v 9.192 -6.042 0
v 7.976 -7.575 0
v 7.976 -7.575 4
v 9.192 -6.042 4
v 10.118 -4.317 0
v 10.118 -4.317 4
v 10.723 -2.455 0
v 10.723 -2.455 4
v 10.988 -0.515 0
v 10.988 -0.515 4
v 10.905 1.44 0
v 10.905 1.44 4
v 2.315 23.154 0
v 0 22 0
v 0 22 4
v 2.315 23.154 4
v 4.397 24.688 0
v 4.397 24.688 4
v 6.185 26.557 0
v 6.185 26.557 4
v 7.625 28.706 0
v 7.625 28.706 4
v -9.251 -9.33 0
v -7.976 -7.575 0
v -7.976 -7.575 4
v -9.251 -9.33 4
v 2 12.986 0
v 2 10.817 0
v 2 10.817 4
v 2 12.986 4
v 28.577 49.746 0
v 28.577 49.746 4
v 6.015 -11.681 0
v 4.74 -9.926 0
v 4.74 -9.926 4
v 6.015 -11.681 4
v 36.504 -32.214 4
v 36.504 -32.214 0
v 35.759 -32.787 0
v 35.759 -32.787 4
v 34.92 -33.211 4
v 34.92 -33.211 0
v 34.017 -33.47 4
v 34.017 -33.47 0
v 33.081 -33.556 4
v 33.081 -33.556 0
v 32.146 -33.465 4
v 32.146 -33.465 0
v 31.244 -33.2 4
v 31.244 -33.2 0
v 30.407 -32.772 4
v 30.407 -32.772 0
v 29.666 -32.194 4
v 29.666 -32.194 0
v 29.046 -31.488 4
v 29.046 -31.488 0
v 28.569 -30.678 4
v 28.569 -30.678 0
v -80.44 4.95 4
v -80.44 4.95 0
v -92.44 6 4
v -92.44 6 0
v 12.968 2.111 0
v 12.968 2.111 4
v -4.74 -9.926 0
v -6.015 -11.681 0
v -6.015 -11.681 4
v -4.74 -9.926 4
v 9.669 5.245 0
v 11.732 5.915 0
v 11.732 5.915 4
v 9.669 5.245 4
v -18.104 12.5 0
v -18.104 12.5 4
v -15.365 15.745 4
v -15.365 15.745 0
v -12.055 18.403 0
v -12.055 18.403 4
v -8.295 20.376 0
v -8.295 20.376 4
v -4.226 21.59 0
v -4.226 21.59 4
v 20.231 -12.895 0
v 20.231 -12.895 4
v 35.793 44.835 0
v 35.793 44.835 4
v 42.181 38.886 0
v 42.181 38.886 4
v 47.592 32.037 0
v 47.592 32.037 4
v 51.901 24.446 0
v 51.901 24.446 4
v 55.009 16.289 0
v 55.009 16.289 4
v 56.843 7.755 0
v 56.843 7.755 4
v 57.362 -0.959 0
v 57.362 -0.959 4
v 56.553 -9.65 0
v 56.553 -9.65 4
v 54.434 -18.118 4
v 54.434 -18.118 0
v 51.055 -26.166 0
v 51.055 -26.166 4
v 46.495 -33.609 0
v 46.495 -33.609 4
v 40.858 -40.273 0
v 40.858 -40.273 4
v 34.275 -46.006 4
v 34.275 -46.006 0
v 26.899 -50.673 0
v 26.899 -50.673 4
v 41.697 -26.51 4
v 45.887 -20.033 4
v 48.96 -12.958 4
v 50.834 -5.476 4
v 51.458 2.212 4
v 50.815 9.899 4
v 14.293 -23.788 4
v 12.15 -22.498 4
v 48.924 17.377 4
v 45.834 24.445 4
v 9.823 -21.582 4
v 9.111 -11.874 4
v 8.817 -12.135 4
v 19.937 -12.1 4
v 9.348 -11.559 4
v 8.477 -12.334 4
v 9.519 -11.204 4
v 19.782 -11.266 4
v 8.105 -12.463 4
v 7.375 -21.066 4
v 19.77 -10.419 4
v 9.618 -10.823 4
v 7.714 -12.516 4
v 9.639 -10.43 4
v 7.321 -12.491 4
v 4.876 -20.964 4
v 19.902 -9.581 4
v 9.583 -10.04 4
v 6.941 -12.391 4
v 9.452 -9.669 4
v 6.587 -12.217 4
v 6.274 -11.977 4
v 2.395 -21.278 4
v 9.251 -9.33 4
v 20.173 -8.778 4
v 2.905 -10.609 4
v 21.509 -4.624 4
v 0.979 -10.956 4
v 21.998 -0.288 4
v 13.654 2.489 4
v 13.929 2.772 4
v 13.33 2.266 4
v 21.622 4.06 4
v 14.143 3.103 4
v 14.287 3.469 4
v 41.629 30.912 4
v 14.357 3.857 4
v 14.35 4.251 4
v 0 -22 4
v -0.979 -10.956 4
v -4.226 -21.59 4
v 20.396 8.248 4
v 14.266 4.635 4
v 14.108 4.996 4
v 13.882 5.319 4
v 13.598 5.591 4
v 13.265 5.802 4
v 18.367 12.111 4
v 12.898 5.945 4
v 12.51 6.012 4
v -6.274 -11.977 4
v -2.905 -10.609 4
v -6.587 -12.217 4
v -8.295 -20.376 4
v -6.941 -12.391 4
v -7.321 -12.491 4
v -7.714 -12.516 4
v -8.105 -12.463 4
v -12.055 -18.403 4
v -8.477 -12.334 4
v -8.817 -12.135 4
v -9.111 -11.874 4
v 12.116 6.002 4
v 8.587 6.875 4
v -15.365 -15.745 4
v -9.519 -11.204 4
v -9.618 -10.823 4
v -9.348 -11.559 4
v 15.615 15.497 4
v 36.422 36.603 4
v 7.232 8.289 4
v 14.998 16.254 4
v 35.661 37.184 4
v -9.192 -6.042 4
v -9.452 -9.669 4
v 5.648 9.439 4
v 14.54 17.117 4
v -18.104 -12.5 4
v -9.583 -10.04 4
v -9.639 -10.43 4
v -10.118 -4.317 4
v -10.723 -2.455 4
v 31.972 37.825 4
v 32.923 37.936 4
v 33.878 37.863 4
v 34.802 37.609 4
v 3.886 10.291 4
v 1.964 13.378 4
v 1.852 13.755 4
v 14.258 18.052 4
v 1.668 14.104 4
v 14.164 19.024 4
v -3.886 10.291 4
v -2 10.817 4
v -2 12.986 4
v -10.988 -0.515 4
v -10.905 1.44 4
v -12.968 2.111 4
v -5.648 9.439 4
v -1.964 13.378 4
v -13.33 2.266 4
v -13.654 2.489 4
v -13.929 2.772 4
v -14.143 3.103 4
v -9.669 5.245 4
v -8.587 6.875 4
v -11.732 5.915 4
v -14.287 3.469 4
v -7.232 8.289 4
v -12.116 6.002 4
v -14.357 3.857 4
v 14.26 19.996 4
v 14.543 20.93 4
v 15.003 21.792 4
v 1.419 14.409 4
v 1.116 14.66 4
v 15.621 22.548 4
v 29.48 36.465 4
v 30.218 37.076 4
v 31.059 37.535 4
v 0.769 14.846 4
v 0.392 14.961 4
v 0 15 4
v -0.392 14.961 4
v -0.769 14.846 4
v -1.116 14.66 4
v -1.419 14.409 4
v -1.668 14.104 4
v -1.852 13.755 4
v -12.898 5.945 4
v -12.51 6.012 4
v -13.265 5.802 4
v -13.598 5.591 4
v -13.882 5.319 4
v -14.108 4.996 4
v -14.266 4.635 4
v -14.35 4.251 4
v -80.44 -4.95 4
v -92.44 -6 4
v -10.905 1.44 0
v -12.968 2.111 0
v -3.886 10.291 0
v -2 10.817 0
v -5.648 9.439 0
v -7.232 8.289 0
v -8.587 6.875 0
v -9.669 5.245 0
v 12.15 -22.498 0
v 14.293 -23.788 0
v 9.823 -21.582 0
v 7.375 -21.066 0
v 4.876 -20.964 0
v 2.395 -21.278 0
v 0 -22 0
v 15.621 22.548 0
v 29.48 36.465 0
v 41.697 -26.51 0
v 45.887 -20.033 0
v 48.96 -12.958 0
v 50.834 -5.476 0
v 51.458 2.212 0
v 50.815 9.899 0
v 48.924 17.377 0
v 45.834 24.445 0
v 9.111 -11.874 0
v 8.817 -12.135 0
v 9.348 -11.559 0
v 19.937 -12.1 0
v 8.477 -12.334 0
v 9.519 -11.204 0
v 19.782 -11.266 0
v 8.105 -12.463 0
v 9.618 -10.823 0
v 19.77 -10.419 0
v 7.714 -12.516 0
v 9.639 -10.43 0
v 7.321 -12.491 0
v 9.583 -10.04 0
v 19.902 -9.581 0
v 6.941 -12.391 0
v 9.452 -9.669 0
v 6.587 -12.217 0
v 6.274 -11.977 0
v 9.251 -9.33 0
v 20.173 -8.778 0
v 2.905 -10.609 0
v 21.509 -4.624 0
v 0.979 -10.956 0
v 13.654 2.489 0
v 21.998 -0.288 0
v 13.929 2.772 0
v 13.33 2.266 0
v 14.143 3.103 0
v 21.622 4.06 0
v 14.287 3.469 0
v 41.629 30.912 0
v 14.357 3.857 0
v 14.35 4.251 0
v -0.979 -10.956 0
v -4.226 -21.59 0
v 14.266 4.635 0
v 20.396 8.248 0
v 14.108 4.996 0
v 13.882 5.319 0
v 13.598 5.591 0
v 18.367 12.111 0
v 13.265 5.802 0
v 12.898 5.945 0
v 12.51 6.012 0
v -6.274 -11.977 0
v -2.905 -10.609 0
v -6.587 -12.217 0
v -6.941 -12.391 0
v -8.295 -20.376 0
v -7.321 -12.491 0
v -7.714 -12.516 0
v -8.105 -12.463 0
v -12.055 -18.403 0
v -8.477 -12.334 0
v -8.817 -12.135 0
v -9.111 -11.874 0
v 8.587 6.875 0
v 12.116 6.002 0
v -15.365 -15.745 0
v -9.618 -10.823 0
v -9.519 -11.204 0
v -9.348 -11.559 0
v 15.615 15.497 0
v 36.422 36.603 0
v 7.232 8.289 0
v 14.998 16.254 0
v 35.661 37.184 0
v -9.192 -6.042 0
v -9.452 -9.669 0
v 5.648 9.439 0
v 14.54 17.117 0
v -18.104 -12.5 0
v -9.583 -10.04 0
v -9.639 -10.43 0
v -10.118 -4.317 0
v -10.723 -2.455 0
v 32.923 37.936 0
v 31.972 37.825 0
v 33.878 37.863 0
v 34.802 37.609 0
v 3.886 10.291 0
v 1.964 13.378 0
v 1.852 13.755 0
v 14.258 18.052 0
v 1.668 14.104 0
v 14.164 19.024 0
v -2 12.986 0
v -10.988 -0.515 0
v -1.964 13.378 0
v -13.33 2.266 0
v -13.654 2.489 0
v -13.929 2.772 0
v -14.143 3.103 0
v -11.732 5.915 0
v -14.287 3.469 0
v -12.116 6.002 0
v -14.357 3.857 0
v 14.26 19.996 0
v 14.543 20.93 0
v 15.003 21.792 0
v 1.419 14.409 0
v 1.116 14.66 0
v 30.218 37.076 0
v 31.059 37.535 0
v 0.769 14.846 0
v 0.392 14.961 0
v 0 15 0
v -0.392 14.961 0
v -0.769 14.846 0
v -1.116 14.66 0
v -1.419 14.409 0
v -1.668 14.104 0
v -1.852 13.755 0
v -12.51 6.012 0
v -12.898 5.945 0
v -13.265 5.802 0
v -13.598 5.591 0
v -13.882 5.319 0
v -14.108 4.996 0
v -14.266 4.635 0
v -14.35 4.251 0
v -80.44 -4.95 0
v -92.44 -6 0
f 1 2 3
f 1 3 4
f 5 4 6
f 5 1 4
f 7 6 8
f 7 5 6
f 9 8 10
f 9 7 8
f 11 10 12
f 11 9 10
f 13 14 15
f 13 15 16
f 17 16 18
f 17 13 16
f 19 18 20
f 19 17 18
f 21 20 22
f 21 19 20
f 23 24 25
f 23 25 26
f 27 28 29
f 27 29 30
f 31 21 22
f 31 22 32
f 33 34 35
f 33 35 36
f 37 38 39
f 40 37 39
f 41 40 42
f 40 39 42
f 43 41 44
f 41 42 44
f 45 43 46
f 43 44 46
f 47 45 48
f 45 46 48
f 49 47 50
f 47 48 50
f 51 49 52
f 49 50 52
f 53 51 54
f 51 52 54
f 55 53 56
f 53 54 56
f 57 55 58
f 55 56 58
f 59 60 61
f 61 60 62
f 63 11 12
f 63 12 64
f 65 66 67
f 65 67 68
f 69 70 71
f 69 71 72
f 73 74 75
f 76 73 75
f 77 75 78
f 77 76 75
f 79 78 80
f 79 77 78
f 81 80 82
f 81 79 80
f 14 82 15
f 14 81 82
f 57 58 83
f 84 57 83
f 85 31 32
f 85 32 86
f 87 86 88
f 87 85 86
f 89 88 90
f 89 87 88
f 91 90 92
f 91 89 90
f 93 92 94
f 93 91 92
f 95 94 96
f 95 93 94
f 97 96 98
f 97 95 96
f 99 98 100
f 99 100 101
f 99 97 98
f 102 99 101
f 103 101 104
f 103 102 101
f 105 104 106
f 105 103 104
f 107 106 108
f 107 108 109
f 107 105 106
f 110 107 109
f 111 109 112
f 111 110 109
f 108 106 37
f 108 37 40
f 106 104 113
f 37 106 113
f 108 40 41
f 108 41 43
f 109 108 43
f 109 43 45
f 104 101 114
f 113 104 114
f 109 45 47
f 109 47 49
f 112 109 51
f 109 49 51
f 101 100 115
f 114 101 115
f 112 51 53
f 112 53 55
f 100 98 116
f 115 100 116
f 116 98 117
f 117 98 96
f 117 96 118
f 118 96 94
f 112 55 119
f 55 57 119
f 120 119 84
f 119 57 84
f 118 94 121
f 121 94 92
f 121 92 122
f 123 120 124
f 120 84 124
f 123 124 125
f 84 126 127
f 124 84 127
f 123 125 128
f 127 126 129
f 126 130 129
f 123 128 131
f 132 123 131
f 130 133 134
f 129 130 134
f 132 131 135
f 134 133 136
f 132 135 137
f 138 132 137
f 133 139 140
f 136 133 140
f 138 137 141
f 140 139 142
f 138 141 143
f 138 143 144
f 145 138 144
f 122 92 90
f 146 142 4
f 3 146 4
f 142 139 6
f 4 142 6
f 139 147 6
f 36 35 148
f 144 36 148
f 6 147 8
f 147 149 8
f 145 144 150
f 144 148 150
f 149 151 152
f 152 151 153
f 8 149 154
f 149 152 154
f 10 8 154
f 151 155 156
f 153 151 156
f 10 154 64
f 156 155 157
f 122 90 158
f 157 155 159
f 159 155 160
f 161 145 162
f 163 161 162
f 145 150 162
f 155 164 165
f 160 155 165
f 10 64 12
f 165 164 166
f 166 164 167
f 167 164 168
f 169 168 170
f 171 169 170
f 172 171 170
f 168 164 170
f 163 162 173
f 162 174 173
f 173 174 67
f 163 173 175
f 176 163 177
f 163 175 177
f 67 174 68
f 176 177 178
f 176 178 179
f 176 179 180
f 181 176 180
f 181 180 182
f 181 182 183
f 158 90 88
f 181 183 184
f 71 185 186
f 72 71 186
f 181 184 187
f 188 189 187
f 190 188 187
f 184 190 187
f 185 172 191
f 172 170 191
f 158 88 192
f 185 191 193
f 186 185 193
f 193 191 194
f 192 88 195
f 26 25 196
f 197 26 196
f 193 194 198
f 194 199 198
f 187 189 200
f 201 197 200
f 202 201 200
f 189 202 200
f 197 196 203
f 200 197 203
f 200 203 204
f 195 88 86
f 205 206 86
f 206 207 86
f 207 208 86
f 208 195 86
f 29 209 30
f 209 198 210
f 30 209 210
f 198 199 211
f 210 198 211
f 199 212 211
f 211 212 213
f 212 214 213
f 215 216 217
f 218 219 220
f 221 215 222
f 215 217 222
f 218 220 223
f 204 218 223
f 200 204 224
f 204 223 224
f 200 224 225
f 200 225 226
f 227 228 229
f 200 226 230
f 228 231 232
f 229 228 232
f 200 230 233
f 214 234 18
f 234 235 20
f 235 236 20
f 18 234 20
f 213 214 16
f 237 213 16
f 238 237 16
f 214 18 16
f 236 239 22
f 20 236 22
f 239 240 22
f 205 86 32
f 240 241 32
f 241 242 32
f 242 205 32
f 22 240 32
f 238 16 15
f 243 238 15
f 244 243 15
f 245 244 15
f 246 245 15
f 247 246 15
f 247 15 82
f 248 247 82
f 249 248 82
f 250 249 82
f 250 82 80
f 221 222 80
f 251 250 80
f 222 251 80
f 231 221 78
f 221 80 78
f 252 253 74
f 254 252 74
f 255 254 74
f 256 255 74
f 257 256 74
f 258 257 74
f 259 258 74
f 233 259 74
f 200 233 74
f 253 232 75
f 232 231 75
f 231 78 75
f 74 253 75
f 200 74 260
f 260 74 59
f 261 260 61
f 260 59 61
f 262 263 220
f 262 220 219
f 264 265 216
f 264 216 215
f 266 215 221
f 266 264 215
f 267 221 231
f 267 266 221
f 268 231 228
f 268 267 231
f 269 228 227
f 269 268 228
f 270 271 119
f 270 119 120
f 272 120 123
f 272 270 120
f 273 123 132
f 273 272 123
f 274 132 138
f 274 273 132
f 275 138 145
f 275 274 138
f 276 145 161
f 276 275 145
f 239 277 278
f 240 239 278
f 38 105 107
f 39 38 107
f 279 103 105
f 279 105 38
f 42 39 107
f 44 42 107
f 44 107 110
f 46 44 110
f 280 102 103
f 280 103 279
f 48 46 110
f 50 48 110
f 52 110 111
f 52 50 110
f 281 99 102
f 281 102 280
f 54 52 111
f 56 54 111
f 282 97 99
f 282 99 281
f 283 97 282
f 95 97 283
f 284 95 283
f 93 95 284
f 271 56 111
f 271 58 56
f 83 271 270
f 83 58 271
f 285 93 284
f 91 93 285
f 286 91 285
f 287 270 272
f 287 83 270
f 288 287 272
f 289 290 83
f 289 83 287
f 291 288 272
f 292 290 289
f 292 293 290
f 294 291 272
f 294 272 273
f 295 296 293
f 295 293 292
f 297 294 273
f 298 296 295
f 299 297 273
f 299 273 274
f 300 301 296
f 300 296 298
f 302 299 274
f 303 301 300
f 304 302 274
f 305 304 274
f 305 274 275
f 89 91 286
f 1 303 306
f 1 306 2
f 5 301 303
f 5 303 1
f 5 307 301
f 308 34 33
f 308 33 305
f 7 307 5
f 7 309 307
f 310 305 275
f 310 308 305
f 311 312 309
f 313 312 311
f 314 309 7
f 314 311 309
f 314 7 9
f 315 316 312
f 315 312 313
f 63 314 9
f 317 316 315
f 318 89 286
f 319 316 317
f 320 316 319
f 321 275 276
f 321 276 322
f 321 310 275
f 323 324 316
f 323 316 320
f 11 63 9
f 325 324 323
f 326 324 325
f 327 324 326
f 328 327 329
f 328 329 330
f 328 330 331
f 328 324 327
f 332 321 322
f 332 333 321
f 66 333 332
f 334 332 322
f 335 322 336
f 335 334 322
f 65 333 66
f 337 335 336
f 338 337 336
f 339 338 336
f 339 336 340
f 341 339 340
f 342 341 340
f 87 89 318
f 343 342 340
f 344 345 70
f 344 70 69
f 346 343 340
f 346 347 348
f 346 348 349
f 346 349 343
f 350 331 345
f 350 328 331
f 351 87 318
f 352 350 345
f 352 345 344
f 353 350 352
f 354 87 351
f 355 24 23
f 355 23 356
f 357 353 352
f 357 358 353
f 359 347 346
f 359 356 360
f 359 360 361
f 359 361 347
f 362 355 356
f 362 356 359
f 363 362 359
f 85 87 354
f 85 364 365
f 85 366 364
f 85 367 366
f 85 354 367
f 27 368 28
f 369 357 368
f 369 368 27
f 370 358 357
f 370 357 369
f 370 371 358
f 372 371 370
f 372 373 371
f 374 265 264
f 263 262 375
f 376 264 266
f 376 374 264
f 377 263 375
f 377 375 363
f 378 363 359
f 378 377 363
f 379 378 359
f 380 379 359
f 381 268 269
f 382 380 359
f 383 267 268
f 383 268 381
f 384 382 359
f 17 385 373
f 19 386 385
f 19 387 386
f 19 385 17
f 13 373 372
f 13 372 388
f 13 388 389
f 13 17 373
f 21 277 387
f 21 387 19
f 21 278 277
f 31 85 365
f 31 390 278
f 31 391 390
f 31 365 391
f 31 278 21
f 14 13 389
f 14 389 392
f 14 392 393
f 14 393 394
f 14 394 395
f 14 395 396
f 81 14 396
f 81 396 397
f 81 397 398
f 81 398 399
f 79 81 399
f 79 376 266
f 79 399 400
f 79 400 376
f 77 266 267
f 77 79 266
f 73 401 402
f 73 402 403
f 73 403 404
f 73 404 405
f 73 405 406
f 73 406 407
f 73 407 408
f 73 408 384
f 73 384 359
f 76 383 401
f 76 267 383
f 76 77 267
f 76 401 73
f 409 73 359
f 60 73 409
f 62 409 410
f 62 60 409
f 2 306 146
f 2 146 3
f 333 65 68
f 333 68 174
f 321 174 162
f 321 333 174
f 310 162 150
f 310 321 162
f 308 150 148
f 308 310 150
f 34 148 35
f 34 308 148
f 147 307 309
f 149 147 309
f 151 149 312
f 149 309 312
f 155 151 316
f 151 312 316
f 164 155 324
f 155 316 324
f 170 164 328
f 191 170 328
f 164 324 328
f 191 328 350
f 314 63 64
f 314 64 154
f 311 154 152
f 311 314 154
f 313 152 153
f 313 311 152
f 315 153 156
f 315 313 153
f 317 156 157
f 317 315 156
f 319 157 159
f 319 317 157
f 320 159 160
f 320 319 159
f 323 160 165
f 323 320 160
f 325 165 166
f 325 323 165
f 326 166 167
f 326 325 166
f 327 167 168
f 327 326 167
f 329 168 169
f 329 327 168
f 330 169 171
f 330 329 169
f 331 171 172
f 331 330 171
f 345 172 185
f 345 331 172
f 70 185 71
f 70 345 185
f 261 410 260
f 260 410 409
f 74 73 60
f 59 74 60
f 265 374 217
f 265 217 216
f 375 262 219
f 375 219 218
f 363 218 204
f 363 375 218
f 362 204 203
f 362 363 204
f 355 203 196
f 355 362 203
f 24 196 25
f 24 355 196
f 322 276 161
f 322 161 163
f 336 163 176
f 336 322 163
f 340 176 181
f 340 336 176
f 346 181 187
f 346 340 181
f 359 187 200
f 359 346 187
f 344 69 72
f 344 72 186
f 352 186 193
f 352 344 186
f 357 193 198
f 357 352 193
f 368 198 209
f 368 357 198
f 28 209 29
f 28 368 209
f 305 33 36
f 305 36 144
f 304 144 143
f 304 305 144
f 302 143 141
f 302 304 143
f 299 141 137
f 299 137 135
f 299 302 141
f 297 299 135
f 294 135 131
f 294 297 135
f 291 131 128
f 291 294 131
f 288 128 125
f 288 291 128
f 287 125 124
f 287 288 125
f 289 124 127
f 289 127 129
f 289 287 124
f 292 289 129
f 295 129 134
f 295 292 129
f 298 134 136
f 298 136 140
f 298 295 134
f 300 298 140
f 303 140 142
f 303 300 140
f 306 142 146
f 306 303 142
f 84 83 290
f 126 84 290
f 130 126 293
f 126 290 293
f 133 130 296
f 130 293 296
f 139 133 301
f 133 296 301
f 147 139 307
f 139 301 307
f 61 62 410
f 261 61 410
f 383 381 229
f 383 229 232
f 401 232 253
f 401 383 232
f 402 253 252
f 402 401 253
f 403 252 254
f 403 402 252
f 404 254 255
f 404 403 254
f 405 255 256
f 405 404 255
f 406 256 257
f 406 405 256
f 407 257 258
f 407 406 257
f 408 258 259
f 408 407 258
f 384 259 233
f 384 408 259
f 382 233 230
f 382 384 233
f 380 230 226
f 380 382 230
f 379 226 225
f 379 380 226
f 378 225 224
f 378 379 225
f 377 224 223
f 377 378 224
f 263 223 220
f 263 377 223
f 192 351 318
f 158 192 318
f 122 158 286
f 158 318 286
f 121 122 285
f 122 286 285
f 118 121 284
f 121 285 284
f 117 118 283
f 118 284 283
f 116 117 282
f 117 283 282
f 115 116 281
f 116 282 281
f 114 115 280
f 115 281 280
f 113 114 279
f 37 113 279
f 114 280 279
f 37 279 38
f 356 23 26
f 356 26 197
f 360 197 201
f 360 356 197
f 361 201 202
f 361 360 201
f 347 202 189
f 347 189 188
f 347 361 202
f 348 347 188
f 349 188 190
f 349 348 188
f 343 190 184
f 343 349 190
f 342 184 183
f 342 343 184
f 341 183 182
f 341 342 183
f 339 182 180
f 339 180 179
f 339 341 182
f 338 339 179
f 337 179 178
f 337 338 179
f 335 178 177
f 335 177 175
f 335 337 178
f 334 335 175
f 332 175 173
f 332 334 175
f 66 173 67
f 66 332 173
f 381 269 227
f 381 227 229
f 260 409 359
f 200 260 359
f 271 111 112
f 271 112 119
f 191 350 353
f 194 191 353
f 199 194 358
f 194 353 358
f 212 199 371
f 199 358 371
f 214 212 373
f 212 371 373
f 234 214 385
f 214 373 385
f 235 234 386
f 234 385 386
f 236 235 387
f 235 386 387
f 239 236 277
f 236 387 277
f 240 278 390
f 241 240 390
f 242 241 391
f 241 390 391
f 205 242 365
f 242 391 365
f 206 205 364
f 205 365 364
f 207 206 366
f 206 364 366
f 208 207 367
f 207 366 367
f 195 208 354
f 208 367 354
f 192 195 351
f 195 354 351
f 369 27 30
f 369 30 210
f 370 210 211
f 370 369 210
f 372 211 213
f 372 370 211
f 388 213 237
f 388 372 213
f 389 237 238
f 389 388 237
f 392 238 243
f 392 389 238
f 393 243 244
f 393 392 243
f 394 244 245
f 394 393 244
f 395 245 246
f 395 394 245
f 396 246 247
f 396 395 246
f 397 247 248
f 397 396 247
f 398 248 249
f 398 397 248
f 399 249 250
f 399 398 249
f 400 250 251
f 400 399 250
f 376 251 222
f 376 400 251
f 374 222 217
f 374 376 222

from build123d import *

# Parameters (mm, degrees)
BOSS_EXTRUDE2_DEPTH = 4


with BuildPart() as part:
    # Sketch1 → Boss-Extrude2 (new body)
    # profile 1 of 2: a face of its own
    with BuildSketch(Plane.XY):
        with BuildLine():
            ThreePointArc((-18.10386699, -12.5), (-22, 0), (-18.10386699, 12.5))
            Line((-18.10386699, 12.5), (-80.44, 4.950136038))
            Line((-80.44, 4.950136038), (-92.44, 6))
            Line((-92.44, 6), (-92.44, -6))
            Line((-92.44, -6), (-80.44, -4.950136038))
            Line((-80.44, -4.950136038), (-18.10386699, -12.5))
        make_face()
    # profile 2 of 2: a face of its own
    with BuildSketch(Plane.XY):
        with BuildLine():
            ThreePointArc((0, 22), (4.39692325, 24.688021922), (7.624562296, 28.705576167))
            Line((7.624562296, 28.705576167), (28.576895981, 49.746134685))
            ThreePointArc((28.576895981, 49.746134685), (57.361992188, -0.958515634), (26.898895733, -50.673132016))
            Line((26.898895733, -50.673132016), (14.293358327, -23.788083824))
            ThreePointArc((14.293358327, -23.788083824), (7.375363605, -21.066013146), (0, -22))
            ThreePointArc((0, -22), (-22, 0), (0, 22))
        make_face()
        with BuildLine():
            ThreePointArc((-10.905276344, 1.44046793), (-10.461621679, -3.399186938), (-7.975868085, -7.575323642))
            Line((-7.975868085, -7.575323642), (-9.250831414, -9.330160117))
            ThreePointArc((-9.250831414, -9.330160117), (-8.816778784, -12.135254915), (-6.014845458, -11.681241534))
            Line((-6.014845458, -11.681241534), (-4.73988213, -9.926405059))
            ThreePointArc((-4.73988213, -9.926405059), (0, -11), (4.73988213, -9.926405059))
            Line((4.73988213, -9.926405059), (6.014845458, -11.681241534))
            ThreePointArc((6.014845458, -11.681241534), (8.816778784, -12.135254915), (9.250831414, -9.330160117))
            Line((9.250831414, -9.330160117), (7.975868085, -7.575323642))
            ThreePointArc((7.975868085, -7.575323642), (10.461621679, -3.399186938), (10.905276344, 1.44046793))
            Line((10.905276344, 1.44046793), (12.968210344, 2.110755818))
            ThreePointArc((12.968210344, 2.110755818), (14.265847744, 4.635254915), (11.732173696, 5.914885461))
            Line((11.732173696, 5.914885461), (9.669239696, 5.244597572))
            ThreePointArc((9.669239696, 5.244597572), (6.465637775, 8.899186938), (1.999949308, 10.816663199))
            Line((1.999949308, 10.816663199), (1.999949308, 12.985760372))
            ThreePointArc((1.999949308, 12.985760372), (0, 15), (-1.999949308, 12.985760372))
            Line((-1.999949308, 12.985760372), (-1.999949308, 10.816663199))
            ThreePointArc((-1.999949308, 10.816663199), (-6.465637775, 8.899186938), (-9.669239696, 5.244597572))
            Line((-9.669239696, 5.244597572), (-11.732173696, 5.914885461))
            ThreePointArc((-11.732173696, 5.914885461), (-14.265847744, 4.635254915), (-12.968210344, 2.110755818))
            Line((-12.968210344, 2.110755818), (-10.905276344, 1.44046793))
        make_face(mode=Mode.SUBTRACT)
        with BuildLine():
            ThreePointArc((20.173023673, -8.777762578), (21.622154849, 4.05985464), (15.61502008, 15.497456175))
            ThreePointArc((15.61502008, 15.497456175), (14.163890039, 19.023799586), (15.620934225, 22.547703457))
            Line((15.620934225, 22.547703457), (29.479774673, 36.464899881))
            ThreePointArc((29.479774673, 36.464899881), (32.923189008, 37.935810816), (36.42242793, 36.603141231))
            ThreePointArc((36.42242793, 36.603141231), (51.457765207, 2.212369547), (36.504075375, -32.213982342))
            ThreePointArc((36.504075375, -32.213982342), (32.145722027, -33.464647666), (28.568596515, -30.678327382))
            Line((28.568596515, -30.678327382), (20.230712329, -12.895315764))
            ThreePointArc((20.230712329, -12.895315764), (19.758292439, -10.842753852), (20.173023673, -8.777762578))
        make_face(mode=Mode.SUBTRACT)
    extrude(amount=BOSS_EXTRUDE2_DEPTH)


solid = part.part
